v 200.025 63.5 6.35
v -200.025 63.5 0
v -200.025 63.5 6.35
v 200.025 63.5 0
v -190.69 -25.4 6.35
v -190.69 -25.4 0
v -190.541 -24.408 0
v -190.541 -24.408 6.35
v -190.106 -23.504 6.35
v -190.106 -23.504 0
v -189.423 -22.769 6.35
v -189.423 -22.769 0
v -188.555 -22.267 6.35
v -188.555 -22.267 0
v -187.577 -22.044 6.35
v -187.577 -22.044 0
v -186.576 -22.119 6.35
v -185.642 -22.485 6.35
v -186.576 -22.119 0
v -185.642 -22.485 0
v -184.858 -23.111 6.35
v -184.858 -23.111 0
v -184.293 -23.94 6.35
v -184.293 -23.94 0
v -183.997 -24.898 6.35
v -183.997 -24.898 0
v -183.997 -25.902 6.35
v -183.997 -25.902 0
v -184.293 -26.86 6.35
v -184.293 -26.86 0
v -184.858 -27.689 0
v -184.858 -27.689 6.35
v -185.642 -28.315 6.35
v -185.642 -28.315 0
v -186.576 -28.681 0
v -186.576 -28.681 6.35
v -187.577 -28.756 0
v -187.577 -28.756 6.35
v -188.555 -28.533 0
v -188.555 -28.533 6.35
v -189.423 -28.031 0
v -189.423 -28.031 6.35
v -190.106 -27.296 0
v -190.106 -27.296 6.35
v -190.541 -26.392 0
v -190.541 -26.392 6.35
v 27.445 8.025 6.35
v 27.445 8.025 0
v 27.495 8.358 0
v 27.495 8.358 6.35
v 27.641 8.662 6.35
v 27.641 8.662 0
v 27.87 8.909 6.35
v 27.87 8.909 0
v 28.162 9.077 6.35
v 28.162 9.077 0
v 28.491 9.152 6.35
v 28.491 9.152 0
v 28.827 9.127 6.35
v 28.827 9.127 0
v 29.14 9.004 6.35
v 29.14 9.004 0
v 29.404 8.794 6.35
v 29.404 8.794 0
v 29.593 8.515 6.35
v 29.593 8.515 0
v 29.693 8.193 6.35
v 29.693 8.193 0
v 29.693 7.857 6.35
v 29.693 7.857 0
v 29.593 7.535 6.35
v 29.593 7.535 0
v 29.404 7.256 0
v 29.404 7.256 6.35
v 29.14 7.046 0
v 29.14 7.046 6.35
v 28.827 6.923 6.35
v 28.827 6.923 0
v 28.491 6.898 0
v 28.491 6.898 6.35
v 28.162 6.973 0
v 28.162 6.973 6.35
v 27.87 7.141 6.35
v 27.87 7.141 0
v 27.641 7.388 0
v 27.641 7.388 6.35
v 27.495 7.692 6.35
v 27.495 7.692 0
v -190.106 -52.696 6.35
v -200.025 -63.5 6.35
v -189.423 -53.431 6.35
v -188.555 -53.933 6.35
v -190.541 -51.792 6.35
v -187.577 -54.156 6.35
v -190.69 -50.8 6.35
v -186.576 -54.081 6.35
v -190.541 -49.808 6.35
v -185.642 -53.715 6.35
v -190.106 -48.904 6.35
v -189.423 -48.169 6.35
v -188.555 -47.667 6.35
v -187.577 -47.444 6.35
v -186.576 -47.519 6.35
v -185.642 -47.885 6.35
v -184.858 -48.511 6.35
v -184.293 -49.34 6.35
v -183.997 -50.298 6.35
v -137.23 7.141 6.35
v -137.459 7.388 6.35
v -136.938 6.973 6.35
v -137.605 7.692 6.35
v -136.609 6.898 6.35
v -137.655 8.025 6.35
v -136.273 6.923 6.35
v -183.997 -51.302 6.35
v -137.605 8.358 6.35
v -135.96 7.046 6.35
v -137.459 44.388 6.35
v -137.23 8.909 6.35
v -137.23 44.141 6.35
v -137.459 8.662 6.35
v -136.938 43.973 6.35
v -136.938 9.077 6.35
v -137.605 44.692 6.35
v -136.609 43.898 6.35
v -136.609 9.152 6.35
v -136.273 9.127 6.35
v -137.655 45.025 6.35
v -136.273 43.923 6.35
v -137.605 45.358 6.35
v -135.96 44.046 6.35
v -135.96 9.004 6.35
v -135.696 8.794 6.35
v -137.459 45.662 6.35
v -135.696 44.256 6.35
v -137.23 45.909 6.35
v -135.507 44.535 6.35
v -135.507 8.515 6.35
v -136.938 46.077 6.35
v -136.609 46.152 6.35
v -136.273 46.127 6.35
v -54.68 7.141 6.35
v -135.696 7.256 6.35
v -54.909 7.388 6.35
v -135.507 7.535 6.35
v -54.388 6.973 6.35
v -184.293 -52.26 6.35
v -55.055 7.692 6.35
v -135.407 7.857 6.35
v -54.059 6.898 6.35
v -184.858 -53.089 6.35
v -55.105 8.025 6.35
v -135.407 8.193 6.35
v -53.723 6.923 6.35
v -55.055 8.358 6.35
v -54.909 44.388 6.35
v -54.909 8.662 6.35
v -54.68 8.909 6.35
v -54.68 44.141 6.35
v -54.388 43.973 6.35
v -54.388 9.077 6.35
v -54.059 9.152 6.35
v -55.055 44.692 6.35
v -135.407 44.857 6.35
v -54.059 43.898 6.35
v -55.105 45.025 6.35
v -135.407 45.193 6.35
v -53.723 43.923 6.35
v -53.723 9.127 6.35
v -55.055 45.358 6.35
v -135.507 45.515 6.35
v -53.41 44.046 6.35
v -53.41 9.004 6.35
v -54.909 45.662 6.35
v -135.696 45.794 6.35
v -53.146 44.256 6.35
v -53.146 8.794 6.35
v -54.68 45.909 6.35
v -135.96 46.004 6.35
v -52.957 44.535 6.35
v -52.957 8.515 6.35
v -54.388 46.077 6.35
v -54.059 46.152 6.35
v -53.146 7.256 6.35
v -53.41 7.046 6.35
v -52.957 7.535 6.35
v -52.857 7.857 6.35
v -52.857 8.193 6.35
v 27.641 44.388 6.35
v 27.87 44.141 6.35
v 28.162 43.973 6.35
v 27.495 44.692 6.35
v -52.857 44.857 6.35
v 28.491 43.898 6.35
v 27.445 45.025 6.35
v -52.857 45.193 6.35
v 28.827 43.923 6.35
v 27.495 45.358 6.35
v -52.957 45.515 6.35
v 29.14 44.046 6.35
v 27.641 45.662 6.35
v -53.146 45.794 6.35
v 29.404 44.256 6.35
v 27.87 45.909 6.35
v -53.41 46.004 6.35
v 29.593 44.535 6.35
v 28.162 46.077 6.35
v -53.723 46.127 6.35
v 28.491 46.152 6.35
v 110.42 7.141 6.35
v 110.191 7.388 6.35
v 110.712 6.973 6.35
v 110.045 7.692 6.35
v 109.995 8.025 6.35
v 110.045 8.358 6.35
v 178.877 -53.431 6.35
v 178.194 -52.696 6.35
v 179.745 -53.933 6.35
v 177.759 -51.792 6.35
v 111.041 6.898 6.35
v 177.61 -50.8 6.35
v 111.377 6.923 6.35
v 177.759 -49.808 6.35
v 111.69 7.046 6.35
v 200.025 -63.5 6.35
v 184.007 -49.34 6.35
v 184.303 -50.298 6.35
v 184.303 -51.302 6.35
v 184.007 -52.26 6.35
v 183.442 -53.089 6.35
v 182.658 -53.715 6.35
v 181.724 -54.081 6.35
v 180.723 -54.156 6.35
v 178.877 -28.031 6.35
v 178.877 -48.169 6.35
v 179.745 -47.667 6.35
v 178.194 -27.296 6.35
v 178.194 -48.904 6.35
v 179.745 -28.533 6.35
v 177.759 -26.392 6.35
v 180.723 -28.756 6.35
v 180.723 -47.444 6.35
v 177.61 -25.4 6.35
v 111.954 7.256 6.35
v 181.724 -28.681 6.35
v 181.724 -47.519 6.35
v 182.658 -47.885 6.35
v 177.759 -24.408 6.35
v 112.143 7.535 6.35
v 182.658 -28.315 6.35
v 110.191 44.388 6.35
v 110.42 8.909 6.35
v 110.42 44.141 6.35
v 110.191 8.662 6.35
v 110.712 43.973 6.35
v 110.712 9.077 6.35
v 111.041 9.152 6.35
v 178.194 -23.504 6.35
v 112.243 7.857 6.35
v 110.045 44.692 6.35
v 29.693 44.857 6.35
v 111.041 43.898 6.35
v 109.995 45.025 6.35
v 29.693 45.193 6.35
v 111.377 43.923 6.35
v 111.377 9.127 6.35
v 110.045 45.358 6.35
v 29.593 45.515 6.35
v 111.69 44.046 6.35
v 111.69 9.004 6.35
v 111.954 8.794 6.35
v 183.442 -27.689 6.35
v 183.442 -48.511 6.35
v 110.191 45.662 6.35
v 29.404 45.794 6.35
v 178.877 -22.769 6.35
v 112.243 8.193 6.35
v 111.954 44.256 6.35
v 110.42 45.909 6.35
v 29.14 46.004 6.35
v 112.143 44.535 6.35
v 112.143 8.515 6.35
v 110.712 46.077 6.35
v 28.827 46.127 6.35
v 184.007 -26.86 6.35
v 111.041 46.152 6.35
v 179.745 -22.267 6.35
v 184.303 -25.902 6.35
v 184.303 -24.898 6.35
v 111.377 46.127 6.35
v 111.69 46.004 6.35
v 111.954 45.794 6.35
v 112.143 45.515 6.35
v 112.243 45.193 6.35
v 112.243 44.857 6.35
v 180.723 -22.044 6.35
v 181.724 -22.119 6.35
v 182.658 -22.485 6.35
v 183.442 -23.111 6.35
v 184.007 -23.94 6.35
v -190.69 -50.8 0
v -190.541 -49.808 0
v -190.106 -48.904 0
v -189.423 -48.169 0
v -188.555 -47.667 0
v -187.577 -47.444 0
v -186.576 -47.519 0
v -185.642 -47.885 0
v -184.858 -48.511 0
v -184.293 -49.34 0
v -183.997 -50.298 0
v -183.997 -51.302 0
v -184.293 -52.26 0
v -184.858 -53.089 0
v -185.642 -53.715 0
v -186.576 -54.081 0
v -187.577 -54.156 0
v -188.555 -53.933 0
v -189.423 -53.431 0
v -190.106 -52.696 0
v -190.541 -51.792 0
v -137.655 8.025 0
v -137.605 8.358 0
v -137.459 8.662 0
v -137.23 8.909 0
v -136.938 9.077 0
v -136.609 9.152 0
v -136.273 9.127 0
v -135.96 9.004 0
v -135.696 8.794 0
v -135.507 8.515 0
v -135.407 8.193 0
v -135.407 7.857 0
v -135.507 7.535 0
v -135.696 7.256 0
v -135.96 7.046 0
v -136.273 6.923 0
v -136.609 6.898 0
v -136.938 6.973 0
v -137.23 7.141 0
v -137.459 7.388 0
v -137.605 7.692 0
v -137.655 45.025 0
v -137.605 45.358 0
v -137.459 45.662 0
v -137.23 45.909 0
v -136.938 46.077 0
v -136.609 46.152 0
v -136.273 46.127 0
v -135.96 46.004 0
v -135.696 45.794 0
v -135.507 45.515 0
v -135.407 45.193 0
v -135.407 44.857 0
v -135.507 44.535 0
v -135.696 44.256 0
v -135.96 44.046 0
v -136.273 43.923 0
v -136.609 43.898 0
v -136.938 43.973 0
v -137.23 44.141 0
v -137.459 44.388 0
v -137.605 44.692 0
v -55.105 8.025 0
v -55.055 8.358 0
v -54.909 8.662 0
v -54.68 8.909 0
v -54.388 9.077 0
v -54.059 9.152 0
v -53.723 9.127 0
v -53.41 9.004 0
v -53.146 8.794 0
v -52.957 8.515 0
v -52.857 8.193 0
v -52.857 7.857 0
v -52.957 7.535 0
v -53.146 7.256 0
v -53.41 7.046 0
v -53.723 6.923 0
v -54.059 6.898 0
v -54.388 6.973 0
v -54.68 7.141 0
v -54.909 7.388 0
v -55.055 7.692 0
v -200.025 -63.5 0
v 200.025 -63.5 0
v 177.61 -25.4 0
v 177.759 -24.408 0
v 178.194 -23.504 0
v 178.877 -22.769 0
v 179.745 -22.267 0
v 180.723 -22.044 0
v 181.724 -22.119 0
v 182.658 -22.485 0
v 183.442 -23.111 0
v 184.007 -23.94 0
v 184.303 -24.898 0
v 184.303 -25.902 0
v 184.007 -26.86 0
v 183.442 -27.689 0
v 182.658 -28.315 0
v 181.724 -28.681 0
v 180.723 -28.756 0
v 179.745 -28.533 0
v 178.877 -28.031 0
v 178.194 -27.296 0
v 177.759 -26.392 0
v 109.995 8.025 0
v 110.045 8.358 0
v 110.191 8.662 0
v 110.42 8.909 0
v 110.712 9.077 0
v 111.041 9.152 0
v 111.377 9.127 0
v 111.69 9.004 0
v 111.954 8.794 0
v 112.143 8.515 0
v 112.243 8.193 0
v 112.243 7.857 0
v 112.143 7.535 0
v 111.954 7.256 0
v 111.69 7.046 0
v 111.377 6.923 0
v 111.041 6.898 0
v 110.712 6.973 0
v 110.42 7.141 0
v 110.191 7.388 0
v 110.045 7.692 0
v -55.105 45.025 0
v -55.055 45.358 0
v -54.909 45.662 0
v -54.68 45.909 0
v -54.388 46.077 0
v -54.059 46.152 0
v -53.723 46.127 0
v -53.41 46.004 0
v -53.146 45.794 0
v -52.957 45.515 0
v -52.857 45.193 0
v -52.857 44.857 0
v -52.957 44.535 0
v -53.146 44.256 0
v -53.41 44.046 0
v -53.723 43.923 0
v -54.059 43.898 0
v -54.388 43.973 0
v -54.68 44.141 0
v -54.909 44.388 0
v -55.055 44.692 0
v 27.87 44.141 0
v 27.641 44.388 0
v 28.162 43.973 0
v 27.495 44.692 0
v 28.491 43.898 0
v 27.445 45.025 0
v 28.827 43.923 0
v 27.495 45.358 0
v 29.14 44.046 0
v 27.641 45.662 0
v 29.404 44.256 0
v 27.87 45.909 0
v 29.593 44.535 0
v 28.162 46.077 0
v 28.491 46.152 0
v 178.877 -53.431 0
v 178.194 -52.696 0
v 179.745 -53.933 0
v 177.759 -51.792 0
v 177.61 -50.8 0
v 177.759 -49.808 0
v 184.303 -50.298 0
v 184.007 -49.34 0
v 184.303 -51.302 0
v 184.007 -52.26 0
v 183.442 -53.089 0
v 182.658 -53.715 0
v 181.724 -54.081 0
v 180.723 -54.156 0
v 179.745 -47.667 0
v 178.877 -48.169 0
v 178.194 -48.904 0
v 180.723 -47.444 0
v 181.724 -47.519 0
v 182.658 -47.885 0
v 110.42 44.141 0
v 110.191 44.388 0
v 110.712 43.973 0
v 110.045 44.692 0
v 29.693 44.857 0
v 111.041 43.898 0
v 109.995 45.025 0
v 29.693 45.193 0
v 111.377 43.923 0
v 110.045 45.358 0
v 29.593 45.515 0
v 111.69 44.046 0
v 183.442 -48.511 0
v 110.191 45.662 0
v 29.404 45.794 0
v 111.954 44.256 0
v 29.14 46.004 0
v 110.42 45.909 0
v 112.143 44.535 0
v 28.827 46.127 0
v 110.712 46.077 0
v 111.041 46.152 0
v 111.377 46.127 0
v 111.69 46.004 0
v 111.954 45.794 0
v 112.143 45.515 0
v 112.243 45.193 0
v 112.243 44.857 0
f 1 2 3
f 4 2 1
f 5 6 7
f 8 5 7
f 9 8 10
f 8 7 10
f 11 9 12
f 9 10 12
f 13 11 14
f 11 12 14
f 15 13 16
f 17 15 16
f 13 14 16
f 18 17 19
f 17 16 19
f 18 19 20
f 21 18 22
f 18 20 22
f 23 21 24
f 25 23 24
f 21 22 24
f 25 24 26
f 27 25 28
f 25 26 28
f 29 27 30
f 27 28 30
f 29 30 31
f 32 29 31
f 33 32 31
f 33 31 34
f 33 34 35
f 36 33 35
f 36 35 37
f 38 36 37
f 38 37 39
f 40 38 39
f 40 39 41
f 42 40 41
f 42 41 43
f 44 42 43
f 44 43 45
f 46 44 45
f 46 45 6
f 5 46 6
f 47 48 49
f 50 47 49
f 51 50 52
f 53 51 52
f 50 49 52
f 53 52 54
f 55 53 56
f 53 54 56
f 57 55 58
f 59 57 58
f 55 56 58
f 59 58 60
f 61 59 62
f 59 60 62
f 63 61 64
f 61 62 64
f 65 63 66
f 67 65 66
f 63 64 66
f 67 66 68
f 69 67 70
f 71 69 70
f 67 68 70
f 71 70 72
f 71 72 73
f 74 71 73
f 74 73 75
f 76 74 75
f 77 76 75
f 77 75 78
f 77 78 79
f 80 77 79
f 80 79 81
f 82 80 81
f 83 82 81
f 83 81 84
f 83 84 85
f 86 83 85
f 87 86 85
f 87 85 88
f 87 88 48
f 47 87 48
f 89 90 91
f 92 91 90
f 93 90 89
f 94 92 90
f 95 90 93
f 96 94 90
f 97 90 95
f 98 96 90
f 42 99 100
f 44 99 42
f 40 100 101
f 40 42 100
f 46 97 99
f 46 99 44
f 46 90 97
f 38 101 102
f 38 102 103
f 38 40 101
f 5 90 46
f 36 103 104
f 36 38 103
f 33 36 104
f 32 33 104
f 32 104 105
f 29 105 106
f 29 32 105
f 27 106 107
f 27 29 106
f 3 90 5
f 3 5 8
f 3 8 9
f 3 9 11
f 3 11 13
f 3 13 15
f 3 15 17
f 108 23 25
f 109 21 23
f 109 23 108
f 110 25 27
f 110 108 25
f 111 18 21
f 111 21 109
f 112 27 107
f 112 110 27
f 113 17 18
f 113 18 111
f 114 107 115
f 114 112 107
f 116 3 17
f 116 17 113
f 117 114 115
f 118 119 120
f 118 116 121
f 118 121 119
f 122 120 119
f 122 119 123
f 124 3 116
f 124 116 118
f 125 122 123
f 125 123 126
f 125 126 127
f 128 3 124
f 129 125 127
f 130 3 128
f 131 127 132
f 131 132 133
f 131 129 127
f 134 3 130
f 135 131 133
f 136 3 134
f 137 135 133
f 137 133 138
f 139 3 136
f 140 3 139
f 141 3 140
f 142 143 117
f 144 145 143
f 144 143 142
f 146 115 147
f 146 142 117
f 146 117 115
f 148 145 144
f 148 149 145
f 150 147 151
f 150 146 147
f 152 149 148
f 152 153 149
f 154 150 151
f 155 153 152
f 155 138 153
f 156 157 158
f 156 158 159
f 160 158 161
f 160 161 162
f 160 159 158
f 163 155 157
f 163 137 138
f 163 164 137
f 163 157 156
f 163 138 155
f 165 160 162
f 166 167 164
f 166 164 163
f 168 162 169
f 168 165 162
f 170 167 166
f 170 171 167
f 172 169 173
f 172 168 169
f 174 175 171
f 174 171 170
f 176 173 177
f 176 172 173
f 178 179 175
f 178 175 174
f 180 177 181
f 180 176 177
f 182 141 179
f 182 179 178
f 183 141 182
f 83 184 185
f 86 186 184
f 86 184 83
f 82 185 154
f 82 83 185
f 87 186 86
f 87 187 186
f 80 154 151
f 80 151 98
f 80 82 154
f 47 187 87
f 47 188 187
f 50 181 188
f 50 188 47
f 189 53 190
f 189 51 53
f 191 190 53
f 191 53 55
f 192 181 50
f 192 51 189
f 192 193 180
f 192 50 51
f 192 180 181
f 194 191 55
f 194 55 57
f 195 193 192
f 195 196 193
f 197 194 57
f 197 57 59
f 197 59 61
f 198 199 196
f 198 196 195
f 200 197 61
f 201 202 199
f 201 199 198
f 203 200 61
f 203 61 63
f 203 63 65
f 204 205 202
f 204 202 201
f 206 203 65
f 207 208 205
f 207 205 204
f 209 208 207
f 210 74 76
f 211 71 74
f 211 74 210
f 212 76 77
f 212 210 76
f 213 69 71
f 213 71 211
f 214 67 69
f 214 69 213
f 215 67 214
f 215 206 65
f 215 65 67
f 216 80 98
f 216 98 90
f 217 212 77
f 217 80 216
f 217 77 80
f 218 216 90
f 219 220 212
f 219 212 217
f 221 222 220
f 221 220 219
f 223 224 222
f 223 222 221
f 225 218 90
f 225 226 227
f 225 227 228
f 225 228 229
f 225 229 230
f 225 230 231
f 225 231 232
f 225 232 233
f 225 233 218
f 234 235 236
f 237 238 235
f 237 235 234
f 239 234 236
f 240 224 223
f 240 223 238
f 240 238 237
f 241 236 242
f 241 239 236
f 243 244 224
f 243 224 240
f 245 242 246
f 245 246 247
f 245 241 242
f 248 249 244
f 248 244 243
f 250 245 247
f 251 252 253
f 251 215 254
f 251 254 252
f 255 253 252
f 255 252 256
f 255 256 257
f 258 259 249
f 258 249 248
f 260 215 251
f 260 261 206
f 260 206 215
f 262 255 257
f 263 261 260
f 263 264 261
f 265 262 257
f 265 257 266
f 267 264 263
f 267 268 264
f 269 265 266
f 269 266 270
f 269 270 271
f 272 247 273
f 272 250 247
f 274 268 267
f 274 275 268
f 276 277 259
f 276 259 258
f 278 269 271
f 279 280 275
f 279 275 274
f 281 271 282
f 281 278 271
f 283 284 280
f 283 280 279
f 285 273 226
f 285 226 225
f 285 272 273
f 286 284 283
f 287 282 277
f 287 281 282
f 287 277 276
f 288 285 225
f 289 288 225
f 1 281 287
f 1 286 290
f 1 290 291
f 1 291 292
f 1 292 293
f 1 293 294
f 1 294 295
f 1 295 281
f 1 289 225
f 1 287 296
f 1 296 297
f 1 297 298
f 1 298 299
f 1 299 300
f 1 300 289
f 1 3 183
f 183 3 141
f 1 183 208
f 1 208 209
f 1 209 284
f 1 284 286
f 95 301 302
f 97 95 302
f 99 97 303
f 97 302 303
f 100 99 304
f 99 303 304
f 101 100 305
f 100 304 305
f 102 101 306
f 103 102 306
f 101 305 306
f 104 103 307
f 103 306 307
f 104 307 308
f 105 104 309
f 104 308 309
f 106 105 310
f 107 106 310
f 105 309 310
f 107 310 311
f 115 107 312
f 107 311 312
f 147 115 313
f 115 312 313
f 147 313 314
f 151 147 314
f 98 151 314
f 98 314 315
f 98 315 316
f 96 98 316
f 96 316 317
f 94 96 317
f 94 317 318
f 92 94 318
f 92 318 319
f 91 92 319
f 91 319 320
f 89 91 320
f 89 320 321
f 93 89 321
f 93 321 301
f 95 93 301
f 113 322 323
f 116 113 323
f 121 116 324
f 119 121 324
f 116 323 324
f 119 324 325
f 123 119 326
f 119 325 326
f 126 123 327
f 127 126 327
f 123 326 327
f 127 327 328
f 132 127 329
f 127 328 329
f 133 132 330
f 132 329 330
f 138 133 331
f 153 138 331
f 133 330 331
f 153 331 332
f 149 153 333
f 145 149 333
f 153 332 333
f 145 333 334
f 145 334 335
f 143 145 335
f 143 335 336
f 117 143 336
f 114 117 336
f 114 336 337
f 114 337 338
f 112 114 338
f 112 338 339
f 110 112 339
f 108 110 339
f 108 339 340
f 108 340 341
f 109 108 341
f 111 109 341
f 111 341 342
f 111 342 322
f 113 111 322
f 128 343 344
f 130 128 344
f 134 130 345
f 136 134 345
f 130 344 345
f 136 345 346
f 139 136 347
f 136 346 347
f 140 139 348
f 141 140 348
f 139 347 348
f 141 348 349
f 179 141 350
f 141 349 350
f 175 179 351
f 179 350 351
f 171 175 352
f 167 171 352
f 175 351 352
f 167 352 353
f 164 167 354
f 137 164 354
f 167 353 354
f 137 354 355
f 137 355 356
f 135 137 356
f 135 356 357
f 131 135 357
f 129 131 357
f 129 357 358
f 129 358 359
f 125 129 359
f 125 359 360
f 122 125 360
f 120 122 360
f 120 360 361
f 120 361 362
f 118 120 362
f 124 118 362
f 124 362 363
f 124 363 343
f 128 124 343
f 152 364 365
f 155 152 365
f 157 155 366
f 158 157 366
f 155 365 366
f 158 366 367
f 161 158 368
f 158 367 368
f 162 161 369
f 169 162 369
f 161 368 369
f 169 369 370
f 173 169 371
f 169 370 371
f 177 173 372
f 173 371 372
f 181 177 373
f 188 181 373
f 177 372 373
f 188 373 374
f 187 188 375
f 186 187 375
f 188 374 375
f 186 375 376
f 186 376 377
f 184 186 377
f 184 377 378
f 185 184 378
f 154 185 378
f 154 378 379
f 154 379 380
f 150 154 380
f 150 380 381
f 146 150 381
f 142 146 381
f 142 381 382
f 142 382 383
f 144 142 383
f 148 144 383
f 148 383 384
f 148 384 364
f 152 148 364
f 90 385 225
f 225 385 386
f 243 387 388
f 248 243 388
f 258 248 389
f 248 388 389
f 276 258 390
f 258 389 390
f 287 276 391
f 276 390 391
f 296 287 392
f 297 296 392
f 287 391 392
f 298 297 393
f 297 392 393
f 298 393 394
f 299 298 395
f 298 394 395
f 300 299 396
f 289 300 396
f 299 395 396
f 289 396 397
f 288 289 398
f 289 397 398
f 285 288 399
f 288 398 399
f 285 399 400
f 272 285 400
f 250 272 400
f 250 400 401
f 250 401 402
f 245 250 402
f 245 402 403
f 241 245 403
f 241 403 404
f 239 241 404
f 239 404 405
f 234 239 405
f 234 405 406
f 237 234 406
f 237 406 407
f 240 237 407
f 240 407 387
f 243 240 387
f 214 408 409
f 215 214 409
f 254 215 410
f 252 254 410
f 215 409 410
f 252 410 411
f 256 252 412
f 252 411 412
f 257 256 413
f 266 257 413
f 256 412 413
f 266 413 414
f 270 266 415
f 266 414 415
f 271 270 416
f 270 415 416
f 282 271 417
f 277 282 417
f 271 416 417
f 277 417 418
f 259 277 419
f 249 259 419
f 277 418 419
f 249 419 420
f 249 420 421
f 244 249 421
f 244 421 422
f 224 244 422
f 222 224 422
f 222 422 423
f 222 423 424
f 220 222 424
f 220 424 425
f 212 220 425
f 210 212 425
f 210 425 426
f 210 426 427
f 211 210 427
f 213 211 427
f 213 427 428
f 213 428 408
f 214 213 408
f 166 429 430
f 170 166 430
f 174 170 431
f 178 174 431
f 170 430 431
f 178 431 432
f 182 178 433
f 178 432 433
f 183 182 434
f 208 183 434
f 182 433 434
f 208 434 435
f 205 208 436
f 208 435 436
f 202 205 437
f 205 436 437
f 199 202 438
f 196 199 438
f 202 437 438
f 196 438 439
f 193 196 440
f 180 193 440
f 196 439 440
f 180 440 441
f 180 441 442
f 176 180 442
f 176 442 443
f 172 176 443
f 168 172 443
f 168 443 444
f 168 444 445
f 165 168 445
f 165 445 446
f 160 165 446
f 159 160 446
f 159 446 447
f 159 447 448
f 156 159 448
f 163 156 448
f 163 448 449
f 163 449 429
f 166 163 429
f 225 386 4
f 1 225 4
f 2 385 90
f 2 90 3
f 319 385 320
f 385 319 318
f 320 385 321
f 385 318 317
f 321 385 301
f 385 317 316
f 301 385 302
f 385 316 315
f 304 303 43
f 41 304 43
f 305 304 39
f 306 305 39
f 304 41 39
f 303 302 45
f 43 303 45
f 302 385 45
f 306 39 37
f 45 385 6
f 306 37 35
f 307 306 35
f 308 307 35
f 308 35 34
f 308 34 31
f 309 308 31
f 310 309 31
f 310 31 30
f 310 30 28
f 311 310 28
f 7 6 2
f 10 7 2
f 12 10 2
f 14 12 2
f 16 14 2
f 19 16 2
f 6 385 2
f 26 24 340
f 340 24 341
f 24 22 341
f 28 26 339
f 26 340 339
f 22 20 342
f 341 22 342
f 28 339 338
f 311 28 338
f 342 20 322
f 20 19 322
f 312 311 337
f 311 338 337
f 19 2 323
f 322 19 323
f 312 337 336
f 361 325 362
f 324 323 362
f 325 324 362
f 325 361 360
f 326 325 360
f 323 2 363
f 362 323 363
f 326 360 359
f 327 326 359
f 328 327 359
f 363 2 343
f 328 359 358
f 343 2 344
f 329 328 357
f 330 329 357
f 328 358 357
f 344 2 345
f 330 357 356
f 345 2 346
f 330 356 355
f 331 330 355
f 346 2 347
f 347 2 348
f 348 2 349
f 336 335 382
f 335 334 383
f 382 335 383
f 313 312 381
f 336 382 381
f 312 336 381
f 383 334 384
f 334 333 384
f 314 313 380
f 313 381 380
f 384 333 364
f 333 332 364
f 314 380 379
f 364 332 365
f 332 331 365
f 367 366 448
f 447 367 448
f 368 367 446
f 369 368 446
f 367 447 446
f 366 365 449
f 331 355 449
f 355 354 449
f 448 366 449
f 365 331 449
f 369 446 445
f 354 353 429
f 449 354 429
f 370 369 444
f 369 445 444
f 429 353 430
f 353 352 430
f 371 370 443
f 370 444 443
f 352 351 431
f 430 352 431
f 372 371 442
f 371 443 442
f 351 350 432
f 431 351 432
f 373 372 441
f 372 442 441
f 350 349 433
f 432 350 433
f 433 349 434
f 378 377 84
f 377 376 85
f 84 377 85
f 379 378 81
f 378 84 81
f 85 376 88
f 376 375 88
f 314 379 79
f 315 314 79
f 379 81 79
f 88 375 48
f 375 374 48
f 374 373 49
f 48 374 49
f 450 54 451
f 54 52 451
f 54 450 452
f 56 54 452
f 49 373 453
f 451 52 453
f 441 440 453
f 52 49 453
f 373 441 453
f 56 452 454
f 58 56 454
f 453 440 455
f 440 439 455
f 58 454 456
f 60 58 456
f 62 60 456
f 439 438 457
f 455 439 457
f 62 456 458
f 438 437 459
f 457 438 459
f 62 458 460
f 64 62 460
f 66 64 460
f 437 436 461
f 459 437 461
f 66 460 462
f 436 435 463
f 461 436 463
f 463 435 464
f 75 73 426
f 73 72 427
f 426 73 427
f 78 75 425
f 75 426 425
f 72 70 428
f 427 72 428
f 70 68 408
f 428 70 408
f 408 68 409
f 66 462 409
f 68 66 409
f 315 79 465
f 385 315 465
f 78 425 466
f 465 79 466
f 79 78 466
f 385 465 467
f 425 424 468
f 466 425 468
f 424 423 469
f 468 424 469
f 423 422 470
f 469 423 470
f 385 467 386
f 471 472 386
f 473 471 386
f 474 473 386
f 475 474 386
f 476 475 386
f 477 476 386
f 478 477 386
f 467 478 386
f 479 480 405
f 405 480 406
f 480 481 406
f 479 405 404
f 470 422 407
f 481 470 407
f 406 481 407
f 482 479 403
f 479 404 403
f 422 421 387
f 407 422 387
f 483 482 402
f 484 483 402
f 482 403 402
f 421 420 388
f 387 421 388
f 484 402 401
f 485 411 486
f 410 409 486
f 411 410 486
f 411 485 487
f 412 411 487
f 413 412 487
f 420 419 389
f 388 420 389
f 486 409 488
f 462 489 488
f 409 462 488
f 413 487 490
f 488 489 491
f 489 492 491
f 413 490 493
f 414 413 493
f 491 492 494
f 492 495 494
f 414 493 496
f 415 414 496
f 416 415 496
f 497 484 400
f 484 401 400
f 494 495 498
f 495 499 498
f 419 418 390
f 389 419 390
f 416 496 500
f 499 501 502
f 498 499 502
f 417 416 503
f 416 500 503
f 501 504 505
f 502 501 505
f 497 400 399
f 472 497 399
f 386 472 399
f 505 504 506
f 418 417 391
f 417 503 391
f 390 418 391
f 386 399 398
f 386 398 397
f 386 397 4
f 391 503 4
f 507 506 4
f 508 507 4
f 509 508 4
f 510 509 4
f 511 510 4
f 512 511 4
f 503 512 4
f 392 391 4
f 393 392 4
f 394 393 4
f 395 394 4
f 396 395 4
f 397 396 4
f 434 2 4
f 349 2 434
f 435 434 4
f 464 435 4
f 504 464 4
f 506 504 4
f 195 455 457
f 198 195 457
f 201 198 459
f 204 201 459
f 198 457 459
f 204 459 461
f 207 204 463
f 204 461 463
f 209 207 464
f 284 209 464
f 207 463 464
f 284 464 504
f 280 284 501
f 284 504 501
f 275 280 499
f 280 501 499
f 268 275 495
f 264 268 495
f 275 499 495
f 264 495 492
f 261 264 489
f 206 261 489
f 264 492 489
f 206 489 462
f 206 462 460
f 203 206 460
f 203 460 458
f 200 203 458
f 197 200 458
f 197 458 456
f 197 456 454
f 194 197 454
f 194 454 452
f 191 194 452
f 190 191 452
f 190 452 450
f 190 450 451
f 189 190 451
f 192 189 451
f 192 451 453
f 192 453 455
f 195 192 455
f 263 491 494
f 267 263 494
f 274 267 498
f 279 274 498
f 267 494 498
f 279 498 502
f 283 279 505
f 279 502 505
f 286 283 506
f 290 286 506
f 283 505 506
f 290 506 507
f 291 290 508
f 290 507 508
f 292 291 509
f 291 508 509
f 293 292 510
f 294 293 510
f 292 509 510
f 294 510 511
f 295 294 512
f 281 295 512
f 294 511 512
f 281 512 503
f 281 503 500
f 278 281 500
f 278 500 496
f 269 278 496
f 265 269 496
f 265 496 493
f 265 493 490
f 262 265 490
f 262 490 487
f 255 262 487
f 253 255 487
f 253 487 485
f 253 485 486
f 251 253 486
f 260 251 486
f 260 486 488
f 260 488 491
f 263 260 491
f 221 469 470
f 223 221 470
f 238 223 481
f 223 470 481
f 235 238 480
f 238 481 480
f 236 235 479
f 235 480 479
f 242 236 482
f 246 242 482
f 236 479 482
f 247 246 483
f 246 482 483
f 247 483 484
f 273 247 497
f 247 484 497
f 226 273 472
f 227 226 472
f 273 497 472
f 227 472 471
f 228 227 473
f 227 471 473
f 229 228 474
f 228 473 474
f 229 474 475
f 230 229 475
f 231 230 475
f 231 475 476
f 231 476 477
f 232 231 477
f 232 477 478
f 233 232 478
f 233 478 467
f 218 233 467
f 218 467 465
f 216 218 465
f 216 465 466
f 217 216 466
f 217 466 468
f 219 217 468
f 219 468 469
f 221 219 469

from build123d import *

# Parameters (mm, degrees)
SKETCH1_W             = 400.05
SKETCH1_H             = 127
BOSS_EXTRUDE1_DEPTH   = 6.35
SKETCH2_R             = 3.3655
CUT_EXTRUDE1_DEPTH    = 7.35
F_4_40_TAPPED_HOLE1_D = 2.2606


with BuildPart() as part:
    # Sketch1 → Boss-Extrude1 (new body)
    with BuildSketch(Plane.XY):
        Rectangle(SKETCH1_W, SKETCH1_H)
    extrude(amount=BOSS_EXTRUDE1_DEPTH)

    # Sketch2 → Cut-Extrude1 (cut, through all)
    with BuildSketch(Plane(origin=(0, 0, 0), x_dir=(-1, 0, 0), z_dir=(0, 0, -1))):
        with Locations((-180.975, -50.8)):
            Circle(SKETCH2_R)
        with Locations((-180.975, -25.4)):
            Circle(SKETCH2_R)
        with Locations((187.325, -50.8)):
            Circle(SKETCH2_R)
        with Locations((187.325, -25.4)):
            Circle(SKETCH2_R)
    extrude(amount=-CUT_EXTRUDE1_DEPTH, mode=Mode.SUBTRACT)

    # #4-40 Tapped Hole1 (through all)
    with Locations(Plane.XY.offset(6.35)):
        with Locations((-136.525, 45.025), (-136.525, 8.025), (-53.975, 45.025), (-53.975, 8.025), (28.575, 45.025), (28.575, 8.025), (111.125, 45.025), (111.125, 8.025)):
            Hole(F_4_40_TAPPED_HOLE1_D / 2)


solid = part.part
